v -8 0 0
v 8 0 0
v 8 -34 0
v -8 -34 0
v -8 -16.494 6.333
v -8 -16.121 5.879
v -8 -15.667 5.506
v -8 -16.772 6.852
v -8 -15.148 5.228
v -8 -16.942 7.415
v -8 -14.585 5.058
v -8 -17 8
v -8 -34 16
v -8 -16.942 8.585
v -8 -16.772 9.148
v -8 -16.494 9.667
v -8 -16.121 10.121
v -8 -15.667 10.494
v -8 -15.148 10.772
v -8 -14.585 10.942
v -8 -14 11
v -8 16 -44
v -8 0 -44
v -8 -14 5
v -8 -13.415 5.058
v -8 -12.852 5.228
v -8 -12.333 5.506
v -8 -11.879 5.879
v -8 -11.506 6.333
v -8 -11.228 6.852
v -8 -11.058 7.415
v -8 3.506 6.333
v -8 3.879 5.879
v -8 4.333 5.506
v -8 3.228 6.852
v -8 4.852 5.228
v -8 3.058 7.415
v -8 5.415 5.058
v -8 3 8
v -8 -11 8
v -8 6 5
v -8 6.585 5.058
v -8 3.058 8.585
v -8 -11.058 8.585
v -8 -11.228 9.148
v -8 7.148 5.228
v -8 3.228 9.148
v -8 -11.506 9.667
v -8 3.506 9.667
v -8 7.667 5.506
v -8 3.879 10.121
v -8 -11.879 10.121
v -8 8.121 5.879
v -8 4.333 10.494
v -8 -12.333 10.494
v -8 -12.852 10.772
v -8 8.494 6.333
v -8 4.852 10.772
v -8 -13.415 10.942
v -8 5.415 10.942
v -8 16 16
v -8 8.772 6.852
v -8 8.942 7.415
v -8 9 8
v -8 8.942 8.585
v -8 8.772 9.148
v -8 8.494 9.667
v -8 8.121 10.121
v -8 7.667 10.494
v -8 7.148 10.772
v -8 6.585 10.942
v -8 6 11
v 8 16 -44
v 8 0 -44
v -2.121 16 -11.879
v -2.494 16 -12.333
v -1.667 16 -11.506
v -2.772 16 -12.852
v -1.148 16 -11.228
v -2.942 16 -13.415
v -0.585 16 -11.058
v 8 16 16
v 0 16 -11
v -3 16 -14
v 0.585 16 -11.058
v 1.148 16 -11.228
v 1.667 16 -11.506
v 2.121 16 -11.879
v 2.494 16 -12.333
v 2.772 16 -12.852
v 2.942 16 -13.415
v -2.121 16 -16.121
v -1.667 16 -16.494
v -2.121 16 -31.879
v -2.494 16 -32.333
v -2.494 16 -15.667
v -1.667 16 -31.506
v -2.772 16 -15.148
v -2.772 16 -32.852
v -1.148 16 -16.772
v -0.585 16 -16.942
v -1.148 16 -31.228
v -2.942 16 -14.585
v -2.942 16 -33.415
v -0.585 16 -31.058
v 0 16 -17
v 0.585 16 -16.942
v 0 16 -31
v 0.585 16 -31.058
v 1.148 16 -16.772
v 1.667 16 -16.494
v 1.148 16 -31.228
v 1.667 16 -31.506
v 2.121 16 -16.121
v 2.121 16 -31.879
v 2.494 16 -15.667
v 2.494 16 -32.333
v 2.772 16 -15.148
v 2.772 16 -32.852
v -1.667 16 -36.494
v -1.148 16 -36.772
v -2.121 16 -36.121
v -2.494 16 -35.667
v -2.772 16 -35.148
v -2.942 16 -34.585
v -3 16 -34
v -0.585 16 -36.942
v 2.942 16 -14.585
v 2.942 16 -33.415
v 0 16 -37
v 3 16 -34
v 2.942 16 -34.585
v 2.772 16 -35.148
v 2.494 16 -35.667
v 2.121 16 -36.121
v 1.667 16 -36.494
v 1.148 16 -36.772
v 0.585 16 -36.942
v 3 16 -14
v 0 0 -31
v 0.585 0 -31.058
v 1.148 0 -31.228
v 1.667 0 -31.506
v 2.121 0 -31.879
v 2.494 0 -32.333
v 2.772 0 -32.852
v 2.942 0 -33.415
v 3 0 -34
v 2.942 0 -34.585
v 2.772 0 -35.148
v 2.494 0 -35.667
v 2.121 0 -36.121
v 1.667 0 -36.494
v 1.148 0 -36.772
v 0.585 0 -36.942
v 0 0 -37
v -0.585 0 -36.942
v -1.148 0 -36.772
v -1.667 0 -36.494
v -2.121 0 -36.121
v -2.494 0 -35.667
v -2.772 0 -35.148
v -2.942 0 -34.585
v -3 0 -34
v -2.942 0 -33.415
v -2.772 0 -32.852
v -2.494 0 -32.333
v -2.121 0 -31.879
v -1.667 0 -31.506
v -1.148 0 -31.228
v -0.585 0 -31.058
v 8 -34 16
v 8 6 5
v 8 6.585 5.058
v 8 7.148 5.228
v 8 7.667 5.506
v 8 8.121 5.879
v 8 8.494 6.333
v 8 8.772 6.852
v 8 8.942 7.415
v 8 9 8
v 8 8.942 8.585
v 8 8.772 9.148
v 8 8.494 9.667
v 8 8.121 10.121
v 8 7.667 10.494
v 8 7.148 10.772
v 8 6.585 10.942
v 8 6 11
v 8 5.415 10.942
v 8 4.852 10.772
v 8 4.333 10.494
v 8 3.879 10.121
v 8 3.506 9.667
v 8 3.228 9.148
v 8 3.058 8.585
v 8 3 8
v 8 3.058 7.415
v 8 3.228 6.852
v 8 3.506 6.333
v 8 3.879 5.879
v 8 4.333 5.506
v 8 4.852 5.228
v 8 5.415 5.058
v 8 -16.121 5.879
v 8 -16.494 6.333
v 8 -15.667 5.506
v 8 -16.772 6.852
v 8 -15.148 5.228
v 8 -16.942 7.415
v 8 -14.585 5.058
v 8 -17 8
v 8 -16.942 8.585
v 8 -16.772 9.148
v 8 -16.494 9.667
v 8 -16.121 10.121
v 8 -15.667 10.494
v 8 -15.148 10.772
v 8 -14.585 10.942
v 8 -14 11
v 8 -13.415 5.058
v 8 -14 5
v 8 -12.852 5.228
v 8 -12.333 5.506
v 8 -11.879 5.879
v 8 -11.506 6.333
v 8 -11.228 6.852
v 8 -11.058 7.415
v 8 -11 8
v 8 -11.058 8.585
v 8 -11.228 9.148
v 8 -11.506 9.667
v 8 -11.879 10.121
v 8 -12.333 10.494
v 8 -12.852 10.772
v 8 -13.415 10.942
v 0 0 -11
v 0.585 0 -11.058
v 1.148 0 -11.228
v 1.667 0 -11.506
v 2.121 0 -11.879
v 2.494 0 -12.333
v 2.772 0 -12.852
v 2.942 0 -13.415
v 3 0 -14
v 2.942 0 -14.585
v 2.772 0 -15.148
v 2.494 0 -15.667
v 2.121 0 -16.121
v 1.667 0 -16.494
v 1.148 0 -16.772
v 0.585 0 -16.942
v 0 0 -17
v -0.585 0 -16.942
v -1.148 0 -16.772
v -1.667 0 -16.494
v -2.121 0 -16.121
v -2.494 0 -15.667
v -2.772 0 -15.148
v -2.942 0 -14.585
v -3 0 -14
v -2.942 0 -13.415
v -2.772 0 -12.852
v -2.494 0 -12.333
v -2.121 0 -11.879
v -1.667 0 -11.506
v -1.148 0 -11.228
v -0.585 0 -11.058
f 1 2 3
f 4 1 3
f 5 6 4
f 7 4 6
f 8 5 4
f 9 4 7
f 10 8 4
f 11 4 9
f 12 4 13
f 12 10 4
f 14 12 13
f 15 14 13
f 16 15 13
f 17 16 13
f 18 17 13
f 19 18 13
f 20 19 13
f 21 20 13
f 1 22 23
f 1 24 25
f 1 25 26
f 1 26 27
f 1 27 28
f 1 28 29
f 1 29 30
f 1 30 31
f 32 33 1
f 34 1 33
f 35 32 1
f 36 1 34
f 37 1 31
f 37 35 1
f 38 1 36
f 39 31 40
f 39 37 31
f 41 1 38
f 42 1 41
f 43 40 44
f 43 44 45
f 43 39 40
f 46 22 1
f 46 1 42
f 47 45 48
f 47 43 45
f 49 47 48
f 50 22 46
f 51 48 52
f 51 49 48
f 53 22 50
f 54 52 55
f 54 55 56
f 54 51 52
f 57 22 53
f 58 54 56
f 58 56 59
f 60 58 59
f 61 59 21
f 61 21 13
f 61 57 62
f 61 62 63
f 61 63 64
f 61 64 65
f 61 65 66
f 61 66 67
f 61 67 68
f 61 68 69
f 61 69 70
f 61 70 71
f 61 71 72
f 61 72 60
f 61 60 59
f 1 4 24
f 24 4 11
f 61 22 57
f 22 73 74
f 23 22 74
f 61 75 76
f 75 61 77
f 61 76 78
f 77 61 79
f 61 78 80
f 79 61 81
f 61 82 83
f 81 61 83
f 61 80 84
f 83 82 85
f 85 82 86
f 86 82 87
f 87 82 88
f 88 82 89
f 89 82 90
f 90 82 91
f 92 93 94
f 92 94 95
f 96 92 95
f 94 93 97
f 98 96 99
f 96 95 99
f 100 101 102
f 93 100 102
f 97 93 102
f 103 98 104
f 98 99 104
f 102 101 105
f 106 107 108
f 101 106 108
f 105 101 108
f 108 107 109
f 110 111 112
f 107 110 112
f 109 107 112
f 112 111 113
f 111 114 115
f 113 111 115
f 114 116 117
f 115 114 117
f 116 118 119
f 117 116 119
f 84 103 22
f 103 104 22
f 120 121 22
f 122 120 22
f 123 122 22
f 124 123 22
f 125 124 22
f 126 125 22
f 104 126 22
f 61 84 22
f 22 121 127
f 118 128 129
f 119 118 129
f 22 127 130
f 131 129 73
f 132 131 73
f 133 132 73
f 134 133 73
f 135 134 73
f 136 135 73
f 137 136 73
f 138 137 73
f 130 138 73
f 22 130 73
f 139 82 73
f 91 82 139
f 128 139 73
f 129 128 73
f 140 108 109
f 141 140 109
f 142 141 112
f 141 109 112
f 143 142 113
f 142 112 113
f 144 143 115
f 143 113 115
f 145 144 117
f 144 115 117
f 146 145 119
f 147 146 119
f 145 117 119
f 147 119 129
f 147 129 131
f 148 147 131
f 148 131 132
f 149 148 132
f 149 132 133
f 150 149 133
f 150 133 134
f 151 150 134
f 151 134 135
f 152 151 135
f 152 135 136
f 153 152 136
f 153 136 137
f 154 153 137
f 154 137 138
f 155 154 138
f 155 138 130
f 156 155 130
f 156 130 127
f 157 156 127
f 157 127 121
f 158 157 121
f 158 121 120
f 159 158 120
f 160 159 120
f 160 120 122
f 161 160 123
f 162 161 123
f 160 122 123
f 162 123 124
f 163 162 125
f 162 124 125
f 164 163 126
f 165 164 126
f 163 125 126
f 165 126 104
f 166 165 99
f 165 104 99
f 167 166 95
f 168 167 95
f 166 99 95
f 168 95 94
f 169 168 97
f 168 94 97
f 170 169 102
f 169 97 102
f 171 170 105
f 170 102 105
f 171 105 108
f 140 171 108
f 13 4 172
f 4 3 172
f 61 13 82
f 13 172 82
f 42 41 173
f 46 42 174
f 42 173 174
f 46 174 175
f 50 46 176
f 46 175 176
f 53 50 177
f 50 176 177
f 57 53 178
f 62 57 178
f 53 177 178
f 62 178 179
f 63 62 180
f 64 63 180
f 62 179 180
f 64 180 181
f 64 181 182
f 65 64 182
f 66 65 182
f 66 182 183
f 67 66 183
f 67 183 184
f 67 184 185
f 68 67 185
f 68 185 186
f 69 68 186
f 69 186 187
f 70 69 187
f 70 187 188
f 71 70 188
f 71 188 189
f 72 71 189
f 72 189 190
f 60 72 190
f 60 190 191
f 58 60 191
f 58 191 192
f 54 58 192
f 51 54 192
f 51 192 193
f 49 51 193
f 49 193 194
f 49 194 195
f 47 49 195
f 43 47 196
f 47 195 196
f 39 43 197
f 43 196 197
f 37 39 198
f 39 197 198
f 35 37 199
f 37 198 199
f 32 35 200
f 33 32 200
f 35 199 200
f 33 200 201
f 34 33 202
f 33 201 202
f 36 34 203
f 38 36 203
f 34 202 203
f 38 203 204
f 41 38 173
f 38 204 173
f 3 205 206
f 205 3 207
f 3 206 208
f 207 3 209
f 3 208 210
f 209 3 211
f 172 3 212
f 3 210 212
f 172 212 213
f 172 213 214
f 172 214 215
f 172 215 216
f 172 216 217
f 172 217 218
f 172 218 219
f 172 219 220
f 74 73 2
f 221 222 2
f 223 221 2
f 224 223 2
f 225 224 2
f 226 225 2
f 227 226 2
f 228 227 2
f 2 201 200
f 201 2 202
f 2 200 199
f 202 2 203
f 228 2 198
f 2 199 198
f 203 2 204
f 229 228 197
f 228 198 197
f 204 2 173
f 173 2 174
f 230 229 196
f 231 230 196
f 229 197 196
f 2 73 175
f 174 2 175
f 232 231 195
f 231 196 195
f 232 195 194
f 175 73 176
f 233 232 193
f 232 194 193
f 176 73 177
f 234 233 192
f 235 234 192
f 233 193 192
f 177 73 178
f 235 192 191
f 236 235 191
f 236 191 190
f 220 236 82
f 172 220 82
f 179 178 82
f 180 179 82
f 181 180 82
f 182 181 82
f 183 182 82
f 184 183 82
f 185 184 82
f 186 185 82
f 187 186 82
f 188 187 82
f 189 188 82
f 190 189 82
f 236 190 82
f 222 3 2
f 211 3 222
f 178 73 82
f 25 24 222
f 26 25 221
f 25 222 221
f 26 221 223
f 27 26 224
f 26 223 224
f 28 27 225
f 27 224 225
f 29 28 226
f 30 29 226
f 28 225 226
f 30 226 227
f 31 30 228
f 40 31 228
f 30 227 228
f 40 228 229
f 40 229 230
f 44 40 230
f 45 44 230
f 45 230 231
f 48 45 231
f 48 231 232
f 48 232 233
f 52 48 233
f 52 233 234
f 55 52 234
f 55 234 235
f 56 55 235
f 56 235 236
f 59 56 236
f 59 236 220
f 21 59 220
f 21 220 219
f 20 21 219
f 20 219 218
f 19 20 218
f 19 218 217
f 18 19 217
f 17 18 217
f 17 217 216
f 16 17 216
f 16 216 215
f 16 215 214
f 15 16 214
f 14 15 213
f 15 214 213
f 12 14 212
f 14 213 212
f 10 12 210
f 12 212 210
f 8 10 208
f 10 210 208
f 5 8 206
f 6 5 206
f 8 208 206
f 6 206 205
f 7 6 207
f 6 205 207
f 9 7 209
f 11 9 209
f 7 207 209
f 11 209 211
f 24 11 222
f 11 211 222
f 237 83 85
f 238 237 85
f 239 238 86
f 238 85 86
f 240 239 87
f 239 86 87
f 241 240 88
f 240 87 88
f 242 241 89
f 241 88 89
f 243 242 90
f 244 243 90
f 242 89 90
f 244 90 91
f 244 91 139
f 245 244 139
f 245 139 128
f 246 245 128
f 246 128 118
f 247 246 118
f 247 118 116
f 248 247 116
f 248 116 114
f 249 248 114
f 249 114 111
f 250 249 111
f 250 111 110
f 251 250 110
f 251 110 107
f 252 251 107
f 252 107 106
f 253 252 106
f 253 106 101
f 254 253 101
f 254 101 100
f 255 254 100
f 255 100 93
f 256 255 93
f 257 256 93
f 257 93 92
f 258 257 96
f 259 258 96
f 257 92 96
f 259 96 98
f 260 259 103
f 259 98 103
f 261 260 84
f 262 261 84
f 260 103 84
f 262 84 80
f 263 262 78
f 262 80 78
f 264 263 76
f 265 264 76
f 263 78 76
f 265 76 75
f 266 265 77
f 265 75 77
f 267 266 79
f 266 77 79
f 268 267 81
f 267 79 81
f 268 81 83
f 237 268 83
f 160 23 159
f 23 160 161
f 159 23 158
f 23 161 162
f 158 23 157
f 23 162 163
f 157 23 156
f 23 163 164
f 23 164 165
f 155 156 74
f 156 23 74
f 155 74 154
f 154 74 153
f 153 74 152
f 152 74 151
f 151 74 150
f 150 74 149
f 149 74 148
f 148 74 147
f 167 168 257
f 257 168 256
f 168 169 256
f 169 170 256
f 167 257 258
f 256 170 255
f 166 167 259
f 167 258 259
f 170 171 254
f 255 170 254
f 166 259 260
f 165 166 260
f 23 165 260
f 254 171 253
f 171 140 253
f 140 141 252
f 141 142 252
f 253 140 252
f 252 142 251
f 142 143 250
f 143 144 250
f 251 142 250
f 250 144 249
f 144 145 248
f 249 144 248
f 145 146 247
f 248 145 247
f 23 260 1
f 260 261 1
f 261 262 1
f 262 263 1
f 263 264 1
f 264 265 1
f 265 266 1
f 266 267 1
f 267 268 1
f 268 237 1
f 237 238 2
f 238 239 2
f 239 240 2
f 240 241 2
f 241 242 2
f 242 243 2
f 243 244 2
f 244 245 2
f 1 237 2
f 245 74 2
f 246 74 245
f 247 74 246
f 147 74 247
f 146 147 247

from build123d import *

# Parameters (mm, degrees)
BOSS_EXTRUDE1_DEPTH = 8
SKETCH2_R           = 3
CUT_EXTRUDE1_DEPTH  = 58.861904566
SKETCH3_R           = 3
CUT_EXTRUDE2_DEPTH  = 68.082039325


with BuildPart() as part:
    # Sketch1 → Boss-Extrude1 (new, symmetric)
    with BuildSketch(Plane(origin=(0, 0, 0), x_dir=(0, 0, -1), z_dir=(1, 0, 0))):
        Polygon((0, 0), (0, -34), (-16, -34), (-16, 16), (44, 16), (44, 0), align=None)
    extrude(amount=BOSS_EXTRUDE1_DEPTH, both=True)

    # Sketch2 → Cut-Extrude1 (cut, through all)
    with BuildSketch(Plane(origin=(8, 0, 0), x_dir=(0, 0, -1), z_dir=(1, 0, 0))):
        with Locations((-8, 6)):
            Circle(SKETCH2_R)
        with Locations((-8, -14)):
            Circle(SKETCH2_R)
    extrude(amount=-CUT_EXTRUDE1_DEPTH, mode=Mode.SUBTRACT)

    # Sketch3 → Cut-Extrude2 (cut, through all)
    with BuildSketch(Plane(origin=(0, 16, 0), x_dir=(1, 0, 0), z_dir=(0, 1, 0))):
        with Locations(Location((0, 34, 0), (0, 0, 270))):
            Circle(SKETCH3_R)
        with Locations(Location((0, 14, 0), (0, 0, 270))):
            Circle(SKETCH3_R)
    extrude(amount=-CUT_EXTRUDE2_DEPTH, mode=Mode.SUBTRACT)


solid = part.part
